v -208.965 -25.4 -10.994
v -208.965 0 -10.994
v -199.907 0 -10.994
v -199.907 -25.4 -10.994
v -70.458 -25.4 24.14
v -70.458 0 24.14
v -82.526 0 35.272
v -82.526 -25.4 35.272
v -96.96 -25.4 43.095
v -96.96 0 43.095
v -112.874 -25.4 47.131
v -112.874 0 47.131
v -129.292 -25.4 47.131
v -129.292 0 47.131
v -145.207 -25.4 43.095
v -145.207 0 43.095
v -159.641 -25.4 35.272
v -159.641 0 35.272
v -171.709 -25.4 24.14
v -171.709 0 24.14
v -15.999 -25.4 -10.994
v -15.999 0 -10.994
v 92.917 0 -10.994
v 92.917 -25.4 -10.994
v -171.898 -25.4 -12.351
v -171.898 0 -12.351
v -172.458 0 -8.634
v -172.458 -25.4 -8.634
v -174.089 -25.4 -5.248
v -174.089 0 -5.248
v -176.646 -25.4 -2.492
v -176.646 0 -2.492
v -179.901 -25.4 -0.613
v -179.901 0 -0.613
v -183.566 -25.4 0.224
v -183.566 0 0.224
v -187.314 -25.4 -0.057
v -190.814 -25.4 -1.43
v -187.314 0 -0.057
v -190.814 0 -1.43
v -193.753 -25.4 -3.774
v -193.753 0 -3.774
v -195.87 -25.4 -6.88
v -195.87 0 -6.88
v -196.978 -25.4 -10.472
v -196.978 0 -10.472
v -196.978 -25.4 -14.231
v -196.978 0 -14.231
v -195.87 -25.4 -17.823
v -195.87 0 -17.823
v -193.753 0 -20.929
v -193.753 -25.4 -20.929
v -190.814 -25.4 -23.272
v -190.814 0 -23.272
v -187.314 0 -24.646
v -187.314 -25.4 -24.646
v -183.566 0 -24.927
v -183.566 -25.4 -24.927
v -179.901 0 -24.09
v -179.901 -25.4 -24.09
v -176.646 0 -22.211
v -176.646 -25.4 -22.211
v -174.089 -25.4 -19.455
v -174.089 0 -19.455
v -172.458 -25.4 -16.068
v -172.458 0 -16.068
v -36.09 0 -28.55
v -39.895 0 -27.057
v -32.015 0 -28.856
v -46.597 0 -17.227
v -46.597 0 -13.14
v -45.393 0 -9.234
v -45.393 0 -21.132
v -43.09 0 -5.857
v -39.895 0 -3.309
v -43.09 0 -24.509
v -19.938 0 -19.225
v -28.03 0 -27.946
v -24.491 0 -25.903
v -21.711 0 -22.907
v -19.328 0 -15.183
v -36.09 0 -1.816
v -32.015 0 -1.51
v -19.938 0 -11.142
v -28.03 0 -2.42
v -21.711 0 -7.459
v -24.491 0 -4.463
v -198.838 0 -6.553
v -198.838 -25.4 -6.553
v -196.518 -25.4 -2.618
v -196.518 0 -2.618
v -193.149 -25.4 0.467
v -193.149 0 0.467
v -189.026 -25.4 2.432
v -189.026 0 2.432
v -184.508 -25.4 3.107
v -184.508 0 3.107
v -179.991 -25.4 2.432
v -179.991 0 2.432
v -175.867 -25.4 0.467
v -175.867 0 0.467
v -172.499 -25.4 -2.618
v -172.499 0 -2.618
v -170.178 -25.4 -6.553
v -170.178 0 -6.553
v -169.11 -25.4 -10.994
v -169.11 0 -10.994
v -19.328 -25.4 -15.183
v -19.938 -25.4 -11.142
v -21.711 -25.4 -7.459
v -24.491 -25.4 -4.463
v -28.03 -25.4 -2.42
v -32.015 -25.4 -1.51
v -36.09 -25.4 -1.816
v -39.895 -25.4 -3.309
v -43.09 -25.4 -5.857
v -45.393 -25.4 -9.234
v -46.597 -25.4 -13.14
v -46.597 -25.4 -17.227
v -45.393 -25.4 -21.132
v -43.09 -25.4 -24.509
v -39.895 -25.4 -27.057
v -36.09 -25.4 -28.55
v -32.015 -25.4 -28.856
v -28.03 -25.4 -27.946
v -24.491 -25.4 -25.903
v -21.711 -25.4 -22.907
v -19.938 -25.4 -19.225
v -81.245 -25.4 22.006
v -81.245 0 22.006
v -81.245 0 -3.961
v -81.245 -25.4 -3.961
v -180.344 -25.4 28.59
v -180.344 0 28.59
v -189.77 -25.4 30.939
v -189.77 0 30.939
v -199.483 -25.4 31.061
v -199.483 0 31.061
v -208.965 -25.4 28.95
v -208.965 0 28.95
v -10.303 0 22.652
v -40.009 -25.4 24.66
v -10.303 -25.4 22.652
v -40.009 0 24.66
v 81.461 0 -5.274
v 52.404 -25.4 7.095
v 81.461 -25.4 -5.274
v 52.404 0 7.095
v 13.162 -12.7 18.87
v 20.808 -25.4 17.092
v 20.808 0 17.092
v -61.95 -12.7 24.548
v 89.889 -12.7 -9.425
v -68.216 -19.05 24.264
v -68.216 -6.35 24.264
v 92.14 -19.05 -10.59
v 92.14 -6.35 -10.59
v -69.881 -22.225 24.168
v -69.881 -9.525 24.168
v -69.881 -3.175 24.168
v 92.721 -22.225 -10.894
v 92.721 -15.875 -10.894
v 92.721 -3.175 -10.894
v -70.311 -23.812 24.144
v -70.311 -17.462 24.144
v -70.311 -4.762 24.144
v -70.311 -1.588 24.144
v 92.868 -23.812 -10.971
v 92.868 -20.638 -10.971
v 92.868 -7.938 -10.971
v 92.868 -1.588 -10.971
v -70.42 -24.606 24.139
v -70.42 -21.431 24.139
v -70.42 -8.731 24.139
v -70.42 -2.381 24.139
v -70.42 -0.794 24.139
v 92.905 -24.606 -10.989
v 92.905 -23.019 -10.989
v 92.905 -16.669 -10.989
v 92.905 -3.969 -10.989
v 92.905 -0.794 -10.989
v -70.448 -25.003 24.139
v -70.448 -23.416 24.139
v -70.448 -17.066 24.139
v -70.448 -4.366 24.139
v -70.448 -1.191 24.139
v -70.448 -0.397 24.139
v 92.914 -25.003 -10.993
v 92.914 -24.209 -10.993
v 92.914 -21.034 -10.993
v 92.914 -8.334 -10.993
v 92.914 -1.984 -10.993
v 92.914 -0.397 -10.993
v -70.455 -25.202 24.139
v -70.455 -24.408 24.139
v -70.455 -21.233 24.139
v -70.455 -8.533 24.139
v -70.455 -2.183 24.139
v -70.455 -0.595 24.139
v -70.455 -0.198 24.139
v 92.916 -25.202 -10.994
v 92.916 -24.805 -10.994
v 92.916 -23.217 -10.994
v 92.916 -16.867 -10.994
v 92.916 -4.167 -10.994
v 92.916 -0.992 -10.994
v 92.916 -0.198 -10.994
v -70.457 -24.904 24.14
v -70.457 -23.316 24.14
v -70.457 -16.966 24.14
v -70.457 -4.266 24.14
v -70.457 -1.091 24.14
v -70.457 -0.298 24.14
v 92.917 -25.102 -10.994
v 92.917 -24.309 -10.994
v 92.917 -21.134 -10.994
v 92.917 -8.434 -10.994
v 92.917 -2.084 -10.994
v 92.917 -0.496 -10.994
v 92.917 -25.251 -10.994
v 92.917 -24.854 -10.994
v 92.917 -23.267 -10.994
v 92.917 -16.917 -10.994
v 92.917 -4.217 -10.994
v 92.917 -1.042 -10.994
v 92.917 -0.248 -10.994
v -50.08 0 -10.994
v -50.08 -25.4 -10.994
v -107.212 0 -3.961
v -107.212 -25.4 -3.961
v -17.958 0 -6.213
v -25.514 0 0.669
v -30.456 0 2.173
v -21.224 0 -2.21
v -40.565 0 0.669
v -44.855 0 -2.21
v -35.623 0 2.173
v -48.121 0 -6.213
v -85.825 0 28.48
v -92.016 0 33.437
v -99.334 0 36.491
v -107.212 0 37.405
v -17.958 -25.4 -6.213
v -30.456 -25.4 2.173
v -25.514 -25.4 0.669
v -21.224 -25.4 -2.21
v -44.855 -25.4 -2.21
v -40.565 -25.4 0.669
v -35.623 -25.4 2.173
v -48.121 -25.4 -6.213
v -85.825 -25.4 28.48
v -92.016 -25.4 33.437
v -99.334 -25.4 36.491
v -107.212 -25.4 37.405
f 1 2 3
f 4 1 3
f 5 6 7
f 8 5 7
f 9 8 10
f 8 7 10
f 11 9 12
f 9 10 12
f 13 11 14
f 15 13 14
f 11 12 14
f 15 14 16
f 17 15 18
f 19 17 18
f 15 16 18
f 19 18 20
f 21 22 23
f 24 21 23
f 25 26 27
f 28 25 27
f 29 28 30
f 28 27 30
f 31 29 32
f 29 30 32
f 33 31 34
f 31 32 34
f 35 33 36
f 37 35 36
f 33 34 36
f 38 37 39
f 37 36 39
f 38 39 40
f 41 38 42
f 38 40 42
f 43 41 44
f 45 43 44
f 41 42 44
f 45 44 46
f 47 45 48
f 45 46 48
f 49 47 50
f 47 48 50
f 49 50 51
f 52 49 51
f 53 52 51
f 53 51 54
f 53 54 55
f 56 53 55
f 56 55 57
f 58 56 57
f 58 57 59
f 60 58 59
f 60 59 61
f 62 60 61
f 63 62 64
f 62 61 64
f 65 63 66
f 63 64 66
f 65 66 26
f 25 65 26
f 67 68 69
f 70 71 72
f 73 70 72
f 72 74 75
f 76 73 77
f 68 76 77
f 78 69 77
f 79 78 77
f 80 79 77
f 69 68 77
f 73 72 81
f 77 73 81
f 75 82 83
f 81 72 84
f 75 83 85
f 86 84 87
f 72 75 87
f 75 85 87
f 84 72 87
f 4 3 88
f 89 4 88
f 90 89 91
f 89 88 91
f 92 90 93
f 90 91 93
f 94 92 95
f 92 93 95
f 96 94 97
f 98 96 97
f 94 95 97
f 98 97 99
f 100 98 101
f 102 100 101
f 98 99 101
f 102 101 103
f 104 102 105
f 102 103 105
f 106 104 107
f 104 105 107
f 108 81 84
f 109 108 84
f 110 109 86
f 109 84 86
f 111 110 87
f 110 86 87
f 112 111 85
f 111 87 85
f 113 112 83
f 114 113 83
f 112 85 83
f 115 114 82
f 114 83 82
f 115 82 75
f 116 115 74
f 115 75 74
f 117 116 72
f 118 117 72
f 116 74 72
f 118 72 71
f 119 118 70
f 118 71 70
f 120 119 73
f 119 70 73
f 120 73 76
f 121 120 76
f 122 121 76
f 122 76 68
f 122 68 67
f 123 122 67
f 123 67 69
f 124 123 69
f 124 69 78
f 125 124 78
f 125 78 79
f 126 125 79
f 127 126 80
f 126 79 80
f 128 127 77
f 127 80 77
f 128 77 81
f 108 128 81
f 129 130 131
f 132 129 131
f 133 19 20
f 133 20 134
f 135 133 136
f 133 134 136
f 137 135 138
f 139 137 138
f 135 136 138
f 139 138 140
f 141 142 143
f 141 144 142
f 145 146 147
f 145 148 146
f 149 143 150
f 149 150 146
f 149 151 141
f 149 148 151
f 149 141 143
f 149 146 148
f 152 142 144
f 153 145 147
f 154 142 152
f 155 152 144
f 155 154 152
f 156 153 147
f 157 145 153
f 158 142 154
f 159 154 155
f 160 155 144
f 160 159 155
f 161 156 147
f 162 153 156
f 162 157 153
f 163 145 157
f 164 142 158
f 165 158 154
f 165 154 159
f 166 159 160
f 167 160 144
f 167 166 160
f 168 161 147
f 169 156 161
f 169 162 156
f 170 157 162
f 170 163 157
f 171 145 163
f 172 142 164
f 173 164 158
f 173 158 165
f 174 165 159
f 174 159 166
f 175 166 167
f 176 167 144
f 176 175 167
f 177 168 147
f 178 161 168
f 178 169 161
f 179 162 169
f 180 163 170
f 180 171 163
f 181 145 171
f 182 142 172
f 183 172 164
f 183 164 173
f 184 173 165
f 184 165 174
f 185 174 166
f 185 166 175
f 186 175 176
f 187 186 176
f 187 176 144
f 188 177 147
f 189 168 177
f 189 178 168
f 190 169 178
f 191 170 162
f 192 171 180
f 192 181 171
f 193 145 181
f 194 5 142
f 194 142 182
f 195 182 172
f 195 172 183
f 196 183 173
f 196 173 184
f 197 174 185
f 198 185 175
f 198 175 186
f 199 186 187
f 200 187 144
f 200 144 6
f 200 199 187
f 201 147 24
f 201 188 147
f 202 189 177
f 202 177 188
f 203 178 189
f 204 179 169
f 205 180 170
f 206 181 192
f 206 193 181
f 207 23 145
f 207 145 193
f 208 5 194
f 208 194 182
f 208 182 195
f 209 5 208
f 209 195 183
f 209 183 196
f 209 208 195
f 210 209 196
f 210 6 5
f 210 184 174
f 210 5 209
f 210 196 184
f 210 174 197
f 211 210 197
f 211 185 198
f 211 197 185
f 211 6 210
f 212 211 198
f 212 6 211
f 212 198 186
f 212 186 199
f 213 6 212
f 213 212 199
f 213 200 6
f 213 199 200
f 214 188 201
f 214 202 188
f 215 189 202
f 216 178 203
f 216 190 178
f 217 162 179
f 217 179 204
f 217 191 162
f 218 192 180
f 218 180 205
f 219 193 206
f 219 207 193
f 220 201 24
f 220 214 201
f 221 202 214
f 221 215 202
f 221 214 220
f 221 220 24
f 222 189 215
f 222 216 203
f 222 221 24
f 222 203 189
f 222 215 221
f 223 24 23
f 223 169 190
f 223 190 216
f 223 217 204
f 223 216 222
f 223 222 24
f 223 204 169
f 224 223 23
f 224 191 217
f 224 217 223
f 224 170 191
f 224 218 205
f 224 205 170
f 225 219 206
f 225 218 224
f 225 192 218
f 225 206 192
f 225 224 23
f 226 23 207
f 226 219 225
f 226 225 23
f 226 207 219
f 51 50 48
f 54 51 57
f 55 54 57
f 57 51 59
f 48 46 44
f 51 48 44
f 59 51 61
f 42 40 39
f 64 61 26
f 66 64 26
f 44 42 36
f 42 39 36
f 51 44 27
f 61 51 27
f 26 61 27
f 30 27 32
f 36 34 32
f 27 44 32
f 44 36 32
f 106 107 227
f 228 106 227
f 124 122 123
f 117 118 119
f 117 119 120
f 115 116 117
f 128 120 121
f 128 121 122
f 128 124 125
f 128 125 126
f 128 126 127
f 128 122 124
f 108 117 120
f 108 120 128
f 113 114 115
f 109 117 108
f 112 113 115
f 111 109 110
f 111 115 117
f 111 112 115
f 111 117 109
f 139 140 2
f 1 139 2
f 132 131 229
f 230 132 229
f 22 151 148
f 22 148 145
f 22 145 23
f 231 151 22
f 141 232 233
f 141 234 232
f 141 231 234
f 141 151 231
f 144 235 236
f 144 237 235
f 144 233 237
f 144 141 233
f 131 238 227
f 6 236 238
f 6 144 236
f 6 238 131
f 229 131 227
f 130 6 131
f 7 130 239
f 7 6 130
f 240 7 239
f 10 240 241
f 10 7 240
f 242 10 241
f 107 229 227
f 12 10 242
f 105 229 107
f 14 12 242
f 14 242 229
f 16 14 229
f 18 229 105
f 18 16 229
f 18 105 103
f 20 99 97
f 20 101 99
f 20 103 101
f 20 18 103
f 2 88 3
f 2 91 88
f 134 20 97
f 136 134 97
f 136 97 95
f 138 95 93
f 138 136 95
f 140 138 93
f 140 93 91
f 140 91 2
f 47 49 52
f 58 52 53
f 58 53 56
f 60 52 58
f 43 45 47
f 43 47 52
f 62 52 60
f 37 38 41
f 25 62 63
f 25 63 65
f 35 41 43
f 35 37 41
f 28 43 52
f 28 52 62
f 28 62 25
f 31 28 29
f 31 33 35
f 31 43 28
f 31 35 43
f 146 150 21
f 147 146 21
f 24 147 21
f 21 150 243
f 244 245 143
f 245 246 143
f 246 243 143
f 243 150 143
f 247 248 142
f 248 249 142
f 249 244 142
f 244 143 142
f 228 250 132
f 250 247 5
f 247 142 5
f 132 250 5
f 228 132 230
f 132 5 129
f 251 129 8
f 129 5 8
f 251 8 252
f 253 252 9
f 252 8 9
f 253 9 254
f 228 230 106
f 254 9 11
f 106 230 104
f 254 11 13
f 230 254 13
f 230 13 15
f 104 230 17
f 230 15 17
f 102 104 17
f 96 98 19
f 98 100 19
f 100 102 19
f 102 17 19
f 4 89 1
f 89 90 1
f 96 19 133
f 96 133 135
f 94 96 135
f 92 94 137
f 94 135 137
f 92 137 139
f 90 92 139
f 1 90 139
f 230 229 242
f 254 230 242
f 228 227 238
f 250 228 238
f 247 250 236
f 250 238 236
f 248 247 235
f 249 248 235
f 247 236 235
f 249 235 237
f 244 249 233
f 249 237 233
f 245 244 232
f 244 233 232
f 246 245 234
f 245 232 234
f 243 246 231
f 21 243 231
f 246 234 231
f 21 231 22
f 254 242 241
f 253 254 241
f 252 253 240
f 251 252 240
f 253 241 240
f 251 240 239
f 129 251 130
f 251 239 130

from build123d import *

# Parameters (mm, degrees)
F0_R     = 13.7110734448
F1_DEPTH = 25.4
F0_R_2   = 12.6105017718


# Not quite as in the source:
# - a feature of the source that left no trace in its solid (it failed there, or was rolled back) is left out


with BuildPart() as f1:
    # F0 (on Front) → F1 (new body)
    with BuildSketch(Plane.XZ):
        with Locations((-33.0394776538, -15.1831200019)):
            Circle(F0_R)
    extrude(amount=F1_DEPTH)


with BuildPart() as f1b:
    # F0 (on Front) → F1, piece 2 (new body)
    with BuildSketch(Plane.XZ):
        with BuildLine():
            Line((92.9161560608, -10.9940236434), (92.9169878364, -10.9940236434))
            add(Edge.make_bspline(
                [(-70.4575031996, 24.1402760148), (-70.4399876122, 24.0586483776), (15.7471046571, 31.0948765027), (92.9262256442, -11.0533031958), (92.9169878364, -10.9940236434)],
                knots=[0.5000562346, 0.5000562346, 0.5000562346, 0.5000562346, 0.7490092067, 1, 1, 1, 1], degree=3))
            ThreePointArc((-70.4575031996, 24.1402760148), (-121.0832968354, 47.6414032219), (-171.7090904713, 24.1402760148))
            ThreePointArc((-171.7090904713, 24.1402760148), (-189.7700354442, 30.9387637162), (-208.9654356241, 28.9503522217))
            Line((-208.9654356241, 28.9503522217), (-208.9654356241, -10.9940236434))
            Line((-208.9654356241, -10.9940236434), (-199.9072730541, -10.9940236434))
            ThreePointArc((-199.9072730541, -10.9940236434), (-184.5083907247, 3.107127368), (-169.1095083952, -10.9940236434))
            Line((-169.1095083952, -10.9940236434), (-154.7798216343, -10.9940236434))
            Line((-154.7798216343, -10.9940236434), (-50.079613924, -10.9940236434))
            ThreePointArc((-50.079613924, -10.9940236434), (-33.0394776538, 2.3643804585), (-15.9993413836, -10.9940236434))
            Line((-15.9993413836, -10.9940236434), (92.9161560608, -10.9940236434))
        make_face()
        with BuildLine():
            ThreePointArc((-107.2120293975, 37.4046415091), (-92.0155707574, 33.43707411), (-81.2452882528, 22.0057591796))
            Line((-81.2452882528, 22.0057591796), (-81.2452882528, -3.9609856904))
            Line((-81.2452882528, -3.9609856904), (-107.2120293975, -3.9609856904))
            Line((-107.2120293975, -3.9609856904), (-107.2120293975, 37.4046415091))
        make_face(mode=Mode.SUBTRACT)
    extrude(amount=F1_DEPTH)


with BuildPart() as f1c:
    # F0 (on Front) → F1, piece 3 (new body)
    with BuildSketch(Plane.XZ):
        with Locations((-184.5083907247, -12.3514701781)):
            Circle(F0_R_2)
    extrude(amount=F1_DEPTH)


solid = Compound([f1.part, f1b.part, f1c.part])
